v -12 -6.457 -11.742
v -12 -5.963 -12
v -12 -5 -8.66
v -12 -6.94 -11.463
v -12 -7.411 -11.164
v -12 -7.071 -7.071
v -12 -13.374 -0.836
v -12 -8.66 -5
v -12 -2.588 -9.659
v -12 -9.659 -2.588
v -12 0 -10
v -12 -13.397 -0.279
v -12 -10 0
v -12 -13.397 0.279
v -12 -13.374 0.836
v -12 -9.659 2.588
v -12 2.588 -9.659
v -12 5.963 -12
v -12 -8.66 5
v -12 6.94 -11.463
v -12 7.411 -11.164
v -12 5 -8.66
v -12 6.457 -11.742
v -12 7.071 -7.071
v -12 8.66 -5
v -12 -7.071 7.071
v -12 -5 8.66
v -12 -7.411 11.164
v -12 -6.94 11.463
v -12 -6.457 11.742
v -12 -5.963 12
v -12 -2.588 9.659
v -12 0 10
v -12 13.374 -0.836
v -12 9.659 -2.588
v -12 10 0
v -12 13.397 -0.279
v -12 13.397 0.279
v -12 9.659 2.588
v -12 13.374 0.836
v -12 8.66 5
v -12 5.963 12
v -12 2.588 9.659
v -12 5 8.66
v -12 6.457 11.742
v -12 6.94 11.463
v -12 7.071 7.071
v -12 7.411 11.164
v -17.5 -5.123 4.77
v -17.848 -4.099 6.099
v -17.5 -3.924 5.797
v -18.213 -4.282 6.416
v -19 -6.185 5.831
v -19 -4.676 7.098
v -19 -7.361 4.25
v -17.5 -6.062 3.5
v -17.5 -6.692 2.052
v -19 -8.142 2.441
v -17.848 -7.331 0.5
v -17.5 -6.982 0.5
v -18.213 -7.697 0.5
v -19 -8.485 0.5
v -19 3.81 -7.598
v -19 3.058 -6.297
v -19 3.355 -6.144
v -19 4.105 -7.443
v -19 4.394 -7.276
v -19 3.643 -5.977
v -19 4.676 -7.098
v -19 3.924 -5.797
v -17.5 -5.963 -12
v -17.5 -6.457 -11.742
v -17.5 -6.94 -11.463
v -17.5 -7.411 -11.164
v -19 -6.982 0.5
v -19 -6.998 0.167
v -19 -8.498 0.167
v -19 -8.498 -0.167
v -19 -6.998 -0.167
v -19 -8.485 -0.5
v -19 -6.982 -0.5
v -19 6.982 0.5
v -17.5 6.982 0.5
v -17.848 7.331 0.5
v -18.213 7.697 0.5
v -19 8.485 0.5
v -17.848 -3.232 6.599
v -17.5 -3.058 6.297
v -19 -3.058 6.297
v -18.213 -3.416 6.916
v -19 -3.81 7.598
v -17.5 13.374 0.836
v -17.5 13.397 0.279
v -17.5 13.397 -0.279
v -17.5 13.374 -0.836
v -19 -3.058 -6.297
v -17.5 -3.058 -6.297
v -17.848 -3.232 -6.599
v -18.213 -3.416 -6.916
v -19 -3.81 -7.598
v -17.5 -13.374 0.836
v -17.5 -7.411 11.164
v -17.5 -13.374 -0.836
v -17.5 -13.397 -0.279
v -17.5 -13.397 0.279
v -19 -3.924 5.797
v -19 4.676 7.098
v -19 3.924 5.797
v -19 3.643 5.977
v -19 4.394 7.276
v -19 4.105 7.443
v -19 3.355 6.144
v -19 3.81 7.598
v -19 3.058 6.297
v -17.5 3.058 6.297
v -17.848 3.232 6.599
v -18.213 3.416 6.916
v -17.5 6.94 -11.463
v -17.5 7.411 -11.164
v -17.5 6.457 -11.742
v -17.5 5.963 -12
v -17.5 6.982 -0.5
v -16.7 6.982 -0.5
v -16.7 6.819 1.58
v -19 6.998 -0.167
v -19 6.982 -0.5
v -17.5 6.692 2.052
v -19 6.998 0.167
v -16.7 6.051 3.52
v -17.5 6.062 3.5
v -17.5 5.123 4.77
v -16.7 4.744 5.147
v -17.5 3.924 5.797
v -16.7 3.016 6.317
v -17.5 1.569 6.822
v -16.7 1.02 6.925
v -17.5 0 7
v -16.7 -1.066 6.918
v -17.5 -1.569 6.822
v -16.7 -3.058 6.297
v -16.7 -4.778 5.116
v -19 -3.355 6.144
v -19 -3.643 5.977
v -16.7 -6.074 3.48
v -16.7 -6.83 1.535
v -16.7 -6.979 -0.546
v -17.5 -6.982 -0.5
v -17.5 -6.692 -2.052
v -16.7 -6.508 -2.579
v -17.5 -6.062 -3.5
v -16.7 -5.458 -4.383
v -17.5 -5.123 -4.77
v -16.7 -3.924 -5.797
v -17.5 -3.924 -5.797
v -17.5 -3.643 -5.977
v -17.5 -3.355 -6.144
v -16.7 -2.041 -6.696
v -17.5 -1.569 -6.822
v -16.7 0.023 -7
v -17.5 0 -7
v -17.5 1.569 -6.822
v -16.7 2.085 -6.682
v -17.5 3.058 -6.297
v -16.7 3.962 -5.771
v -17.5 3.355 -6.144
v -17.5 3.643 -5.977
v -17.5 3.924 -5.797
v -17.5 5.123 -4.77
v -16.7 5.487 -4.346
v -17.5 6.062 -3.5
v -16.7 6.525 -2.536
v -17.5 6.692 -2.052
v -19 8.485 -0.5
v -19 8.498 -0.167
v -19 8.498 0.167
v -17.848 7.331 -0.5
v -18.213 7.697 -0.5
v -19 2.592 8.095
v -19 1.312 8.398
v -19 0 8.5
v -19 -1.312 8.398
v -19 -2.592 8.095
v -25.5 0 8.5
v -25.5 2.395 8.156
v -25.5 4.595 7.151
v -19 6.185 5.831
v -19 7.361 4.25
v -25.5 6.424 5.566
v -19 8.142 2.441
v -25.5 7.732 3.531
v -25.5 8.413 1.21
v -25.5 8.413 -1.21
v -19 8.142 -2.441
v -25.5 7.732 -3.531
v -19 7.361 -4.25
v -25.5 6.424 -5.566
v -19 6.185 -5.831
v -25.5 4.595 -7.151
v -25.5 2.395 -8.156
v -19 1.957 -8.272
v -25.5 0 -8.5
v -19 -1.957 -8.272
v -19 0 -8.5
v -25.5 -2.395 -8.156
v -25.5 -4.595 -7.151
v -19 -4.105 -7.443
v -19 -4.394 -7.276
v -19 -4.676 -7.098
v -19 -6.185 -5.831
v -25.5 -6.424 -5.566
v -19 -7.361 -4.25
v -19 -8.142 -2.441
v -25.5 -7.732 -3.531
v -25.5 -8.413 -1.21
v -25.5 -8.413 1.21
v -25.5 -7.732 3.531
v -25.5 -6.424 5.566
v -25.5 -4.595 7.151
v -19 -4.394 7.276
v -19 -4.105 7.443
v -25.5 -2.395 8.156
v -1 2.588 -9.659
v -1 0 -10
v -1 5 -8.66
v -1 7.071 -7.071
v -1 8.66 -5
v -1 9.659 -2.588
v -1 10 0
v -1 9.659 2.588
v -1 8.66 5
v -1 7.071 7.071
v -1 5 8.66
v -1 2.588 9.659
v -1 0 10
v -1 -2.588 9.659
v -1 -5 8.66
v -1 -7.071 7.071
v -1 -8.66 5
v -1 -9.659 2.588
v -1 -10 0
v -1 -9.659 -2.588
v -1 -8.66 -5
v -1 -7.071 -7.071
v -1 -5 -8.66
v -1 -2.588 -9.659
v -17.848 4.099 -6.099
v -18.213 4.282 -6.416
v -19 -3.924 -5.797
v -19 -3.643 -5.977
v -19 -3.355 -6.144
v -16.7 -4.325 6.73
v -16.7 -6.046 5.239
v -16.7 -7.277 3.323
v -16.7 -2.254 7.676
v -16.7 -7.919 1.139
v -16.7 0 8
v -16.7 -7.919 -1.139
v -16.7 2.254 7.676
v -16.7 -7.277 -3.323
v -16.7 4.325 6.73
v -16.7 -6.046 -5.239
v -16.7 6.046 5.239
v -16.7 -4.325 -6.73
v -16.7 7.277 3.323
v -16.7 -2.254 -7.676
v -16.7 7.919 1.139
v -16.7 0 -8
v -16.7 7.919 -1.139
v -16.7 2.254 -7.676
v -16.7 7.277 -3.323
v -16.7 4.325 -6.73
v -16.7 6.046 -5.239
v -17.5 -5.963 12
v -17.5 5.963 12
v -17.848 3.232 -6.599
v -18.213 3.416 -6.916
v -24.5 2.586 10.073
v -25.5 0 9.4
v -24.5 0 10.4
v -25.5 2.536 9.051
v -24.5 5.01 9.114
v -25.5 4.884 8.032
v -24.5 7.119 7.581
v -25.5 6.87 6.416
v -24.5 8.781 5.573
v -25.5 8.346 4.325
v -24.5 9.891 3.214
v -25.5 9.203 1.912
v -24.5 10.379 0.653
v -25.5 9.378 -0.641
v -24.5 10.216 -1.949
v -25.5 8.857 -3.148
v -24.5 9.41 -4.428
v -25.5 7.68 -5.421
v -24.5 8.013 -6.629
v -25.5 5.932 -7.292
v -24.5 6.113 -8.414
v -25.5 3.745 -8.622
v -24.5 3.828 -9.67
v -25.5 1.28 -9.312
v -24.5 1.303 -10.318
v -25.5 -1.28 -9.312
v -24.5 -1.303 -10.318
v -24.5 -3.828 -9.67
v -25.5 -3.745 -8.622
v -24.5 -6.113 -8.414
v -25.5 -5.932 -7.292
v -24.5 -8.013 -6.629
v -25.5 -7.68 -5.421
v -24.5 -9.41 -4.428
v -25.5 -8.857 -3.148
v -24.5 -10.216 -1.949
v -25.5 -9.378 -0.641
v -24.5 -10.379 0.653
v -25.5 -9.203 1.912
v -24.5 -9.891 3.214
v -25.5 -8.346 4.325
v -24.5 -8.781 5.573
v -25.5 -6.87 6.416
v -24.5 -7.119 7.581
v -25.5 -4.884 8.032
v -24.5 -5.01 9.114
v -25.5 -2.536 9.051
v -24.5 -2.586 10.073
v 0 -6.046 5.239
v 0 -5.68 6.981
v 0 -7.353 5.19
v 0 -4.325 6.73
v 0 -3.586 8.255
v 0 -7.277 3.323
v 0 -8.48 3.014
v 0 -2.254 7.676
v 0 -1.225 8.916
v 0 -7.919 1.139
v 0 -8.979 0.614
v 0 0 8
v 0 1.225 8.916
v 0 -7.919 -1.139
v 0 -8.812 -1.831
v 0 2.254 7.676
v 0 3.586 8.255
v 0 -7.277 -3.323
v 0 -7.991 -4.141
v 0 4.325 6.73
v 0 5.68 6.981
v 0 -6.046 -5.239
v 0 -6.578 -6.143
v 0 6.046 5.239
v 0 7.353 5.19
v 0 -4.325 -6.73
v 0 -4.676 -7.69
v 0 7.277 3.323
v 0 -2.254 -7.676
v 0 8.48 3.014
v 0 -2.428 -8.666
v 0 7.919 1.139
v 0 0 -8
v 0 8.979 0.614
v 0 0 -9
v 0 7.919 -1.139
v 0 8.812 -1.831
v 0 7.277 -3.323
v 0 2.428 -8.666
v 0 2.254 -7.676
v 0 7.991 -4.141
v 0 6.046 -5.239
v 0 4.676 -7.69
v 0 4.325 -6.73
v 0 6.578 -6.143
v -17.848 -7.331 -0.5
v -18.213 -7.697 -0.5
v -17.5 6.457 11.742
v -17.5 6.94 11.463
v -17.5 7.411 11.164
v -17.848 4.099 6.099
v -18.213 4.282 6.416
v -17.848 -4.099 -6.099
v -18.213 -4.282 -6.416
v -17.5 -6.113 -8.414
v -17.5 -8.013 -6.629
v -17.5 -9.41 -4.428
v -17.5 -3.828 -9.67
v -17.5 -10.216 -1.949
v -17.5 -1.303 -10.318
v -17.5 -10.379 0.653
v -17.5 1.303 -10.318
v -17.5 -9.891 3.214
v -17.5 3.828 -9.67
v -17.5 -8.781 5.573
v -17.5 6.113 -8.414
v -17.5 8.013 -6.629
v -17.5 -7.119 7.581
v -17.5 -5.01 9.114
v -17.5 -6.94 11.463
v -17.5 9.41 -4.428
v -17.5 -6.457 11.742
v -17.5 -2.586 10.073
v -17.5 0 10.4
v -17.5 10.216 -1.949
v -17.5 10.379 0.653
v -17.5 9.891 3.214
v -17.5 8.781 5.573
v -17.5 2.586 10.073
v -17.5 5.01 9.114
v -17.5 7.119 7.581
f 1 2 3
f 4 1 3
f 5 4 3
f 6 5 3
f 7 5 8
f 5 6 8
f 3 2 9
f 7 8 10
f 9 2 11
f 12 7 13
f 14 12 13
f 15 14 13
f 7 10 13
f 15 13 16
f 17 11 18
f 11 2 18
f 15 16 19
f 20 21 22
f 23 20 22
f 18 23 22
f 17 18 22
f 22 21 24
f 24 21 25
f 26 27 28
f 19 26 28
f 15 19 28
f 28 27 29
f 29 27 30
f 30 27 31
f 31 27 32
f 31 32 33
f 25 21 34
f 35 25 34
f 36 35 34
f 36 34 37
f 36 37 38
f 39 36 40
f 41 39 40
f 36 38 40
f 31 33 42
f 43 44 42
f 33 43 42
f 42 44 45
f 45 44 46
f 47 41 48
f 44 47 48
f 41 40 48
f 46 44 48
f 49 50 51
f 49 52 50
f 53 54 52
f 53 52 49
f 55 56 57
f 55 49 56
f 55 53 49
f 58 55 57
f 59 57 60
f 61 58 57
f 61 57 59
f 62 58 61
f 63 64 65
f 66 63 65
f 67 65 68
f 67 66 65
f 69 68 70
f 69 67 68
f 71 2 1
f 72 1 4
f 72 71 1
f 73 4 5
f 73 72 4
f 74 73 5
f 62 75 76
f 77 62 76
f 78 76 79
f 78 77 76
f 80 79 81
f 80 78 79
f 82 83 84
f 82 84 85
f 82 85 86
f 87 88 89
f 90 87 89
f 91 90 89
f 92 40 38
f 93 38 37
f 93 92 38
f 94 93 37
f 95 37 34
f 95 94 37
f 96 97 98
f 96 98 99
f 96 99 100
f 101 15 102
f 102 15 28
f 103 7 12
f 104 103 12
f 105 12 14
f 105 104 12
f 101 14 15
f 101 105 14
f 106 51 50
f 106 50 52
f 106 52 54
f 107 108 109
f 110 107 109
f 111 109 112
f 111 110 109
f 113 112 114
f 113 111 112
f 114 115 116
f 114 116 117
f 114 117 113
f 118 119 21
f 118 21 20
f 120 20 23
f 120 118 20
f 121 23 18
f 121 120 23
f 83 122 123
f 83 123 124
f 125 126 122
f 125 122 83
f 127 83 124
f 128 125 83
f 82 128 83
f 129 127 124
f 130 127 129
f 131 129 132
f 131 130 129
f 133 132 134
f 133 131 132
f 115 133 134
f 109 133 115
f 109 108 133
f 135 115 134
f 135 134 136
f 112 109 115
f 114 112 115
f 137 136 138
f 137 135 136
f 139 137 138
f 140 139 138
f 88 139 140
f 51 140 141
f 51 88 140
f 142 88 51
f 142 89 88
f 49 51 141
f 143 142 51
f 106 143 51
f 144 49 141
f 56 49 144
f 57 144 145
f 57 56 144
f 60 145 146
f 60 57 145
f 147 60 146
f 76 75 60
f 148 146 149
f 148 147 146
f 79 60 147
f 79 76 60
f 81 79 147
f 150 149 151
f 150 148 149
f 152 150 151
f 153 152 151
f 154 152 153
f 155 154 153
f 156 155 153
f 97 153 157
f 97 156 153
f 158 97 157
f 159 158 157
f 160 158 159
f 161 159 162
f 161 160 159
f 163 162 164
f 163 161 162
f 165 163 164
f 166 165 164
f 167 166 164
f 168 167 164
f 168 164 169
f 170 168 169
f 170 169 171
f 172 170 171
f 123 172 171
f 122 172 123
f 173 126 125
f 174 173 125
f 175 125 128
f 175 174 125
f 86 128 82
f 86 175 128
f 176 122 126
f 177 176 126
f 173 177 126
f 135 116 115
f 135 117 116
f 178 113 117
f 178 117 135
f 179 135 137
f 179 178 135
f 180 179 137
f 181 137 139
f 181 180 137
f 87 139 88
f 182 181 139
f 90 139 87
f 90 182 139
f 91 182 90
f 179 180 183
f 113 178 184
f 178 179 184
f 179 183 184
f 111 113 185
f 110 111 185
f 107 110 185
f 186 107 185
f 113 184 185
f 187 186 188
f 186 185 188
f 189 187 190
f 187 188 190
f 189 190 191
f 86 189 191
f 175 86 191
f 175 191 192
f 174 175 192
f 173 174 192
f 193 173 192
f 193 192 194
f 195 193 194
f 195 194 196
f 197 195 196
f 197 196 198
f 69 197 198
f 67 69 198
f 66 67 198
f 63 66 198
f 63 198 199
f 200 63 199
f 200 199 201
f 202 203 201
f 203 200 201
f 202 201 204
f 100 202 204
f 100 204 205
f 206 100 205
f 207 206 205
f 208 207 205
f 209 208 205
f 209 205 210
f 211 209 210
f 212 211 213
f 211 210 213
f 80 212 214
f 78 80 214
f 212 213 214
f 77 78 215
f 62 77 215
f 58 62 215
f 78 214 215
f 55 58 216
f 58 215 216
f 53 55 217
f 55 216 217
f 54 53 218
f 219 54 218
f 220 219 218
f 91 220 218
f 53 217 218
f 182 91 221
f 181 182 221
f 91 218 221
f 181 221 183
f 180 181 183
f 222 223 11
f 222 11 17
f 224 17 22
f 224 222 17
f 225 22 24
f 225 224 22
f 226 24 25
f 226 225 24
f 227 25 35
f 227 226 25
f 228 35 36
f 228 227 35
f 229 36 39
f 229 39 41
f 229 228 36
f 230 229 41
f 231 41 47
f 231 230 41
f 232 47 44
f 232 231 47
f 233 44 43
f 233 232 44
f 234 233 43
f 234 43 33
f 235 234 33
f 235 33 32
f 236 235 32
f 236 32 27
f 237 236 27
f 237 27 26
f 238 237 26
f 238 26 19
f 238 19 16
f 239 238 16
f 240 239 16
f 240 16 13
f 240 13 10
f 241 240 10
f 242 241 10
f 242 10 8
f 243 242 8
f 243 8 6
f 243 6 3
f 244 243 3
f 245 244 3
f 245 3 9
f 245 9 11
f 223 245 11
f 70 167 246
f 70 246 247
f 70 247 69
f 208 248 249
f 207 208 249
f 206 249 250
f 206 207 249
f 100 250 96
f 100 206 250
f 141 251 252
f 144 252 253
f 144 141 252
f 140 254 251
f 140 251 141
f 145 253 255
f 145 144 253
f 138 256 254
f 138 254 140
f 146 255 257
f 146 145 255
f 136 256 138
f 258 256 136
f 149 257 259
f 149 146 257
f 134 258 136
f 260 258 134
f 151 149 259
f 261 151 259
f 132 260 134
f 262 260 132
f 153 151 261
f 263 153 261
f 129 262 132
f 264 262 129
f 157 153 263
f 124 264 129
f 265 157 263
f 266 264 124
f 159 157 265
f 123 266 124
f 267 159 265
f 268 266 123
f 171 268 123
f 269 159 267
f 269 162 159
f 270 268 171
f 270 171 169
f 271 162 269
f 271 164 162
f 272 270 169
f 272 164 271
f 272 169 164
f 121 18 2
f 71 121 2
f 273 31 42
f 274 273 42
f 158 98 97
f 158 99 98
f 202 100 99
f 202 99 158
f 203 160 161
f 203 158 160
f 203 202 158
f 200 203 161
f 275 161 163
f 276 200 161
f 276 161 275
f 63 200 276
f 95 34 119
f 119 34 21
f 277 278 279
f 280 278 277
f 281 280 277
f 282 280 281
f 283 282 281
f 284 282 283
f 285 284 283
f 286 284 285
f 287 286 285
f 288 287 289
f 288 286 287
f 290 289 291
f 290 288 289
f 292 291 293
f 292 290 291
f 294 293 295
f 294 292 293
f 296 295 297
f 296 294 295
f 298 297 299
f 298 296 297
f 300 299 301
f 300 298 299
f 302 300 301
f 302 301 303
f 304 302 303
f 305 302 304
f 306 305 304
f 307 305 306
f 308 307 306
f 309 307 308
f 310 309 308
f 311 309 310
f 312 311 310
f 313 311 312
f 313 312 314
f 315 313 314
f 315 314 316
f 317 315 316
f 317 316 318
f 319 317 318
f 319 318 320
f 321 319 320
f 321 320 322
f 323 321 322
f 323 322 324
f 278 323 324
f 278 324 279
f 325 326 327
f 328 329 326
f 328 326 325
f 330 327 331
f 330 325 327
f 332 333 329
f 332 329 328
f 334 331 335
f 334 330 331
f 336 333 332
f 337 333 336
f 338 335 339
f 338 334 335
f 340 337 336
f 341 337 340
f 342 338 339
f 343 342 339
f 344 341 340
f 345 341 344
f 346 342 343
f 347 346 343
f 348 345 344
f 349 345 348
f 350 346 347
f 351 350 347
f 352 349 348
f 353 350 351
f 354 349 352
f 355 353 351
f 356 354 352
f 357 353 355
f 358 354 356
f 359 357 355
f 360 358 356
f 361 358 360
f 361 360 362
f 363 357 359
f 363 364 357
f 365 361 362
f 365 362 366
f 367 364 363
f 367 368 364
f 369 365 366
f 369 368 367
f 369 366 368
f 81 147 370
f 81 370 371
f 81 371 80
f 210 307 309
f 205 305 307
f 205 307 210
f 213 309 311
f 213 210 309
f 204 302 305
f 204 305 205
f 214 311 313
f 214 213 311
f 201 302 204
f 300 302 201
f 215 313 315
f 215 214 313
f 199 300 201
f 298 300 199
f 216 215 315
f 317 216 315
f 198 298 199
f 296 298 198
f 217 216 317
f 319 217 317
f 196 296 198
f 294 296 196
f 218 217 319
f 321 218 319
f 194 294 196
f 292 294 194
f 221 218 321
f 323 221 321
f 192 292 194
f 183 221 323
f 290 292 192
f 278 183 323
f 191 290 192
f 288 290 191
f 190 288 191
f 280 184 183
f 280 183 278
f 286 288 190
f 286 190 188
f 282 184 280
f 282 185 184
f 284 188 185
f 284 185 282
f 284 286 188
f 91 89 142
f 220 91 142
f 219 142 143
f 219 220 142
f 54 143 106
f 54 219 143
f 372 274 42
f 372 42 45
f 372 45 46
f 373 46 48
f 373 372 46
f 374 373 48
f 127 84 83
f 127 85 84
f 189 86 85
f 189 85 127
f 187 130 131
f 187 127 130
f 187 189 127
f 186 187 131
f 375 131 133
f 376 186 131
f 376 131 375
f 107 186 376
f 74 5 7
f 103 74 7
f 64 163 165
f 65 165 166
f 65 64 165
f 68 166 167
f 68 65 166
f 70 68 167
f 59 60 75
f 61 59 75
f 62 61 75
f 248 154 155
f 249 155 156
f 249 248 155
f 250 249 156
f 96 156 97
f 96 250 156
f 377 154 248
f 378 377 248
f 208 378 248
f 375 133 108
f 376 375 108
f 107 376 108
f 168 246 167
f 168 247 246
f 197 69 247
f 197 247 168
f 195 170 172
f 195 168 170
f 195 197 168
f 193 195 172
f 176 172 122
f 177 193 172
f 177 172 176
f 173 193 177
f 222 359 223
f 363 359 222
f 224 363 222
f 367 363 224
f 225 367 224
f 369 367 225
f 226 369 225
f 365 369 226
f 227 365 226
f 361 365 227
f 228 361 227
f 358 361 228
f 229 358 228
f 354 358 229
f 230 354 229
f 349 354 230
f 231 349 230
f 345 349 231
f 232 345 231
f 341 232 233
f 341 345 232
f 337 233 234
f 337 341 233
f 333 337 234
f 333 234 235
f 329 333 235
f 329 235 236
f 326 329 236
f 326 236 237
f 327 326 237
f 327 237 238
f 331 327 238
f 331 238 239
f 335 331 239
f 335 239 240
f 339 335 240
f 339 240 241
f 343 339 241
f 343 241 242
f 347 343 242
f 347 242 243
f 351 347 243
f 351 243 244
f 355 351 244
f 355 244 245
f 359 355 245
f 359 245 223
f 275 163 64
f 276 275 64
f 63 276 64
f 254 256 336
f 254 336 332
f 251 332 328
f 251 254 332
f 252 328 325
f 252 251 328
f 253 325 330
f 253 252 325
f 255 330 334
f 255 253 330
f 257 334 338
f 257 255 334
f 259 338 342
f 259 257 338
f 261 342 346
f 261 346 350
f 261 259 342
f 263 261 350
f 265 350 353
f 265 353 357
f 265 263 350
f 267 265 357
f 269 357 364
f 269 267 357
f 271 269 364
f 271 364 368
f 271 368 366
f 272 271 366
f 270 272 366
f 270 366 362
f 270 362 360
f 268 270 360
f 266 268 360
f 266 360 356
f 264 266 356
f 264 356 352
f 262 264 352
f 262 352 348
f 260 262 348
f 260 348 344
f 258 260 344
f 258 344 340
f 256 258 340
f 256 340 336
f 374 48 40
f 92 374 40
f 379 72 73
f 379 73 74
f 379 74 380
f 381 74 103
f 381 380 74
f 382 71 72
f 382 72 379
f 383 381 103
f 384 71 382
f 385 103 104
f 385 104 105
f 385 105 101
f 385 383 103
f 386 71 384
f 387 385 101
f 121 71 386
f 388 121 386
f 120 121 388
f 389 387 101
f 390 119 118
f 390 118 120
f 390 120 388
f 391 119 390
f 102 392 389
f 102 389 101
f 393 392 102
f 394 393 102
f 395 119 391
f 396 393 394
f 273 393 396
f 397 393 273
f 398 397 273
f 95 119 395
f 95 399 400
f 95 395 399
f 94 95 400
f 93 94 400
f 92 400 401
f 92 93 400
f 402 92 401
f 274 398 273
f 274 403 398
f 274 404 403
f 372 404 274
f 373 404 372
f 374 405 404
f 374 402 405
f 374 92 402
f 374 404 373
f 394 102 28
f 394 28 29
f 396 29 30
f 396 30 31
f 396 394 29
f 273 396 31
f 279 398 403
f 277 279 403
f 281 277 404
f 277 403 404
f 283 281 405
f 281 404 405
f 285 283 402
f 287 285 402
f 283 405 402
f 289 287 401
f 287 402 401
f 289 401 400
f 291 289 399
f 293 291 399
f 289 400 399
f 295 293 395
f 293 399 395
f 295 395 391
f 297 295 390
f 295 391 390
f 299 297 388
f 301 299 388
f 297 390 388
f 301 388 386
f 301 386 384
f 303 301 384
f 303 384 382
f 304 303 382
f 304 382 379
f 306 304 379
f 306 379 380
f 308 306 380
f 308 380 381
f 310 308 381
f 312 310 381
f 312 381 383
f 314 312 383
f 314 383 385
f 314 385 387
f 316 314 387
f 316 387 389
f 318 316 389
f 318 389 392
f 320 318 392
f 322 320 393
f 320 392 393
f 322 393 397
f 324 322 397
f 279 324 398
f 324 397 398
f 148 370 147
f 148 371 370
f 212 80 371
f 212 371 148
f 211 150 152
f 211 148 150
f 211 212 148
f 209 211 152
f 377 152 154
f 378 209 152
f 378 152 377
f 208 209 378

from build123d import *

# Parameters (mm, degrees)
SKETCH_2_R               = 10
EXTRUDE_1_DEPTH          = 12
SKETCH_3_R               = 10
EXTRUDE_2_DEPTH          = 5.5
SKETCH_4_R               = 10.4
EXTRUDE_3_DEPTH          = 8
SKETCH_6_R               = 13.856406461
SKETCH_6_R_2             = 13.4
CUT_EXTRUDE_1_DEPTH      = 26.342651795
CHAMFER_1_SIZE           = 1
EXTRUDE_4_REACH          = 26.545
SKETCH_7_W               = 1
SKETCH_7_H               = 8.5
SKETCH_8_R               = 7
CUT_EXTRUDE_2_DEPTH      = 32.205928924
SKETCH_9_R               = 8.5
CUT_EXTRUDE_3_DEPTH      = 6.5
PATTERN_CIRCULAR_1_COUNT = 6


with BuildPart() as part:
    # Эскиз2 → Вытянуть1 (new body)
    with BuildSketch(Plane(origin=(0, 0, 0), x_dir=(0, 0, -1), z_dir=(1, 0, 0))):
        Circle(SKETCH_2_R)
    extrude(amount=-EXTRUDE_1_DEPTH)

    # Эскиз3 → Вытянуть2 (add)
    # profile 1 of 2: a face of its own
    with BuildSketch(Plane.ZY.offset(12)):
        Polygon((12, -6.92820323), (12, 6.92820323), (0, 13.856406461), (-12, 6.92820323), (-12, -6.92820323), (0, -13.856406461), align=None)
        with Locations(Location((0, 0, 0), (0, 0, 180))):
            Circle(SKETCH_3_R, mode=Mode.SUBTRACT)
    # profile 2 of 2: a face of its own
    with BuildSketch(Plane.ZY.offset(12)):
        with Locations(Location((0, 0, 0), (0, 0, 180))):
            Circle(SKETCH_3_R)
    extrude(amount=EXTRUDE_2_DEPTH)

    # Эскиз4 → Вытянуть3 (add)
    with BuildSketch(Plane.ZY.offset(17.5)):
        Circle(SKETCH_4_R)
    extrude(amount=EXTRUDE_3_DEPTH)

    # Эскиз5 → Вырез-Повернуть1 (revolve, cut)
    with BuildSketch(Plane.XY, mode=Mode.PRIVATE) as cut_revolve_1_sk:
        Polygon((0, 0), (0, 8), (-16.7, 8), (-16.7, 7), (-17.5, 7), (-19, 8.5), (-25.5, 8.5), (-25.5, 0), align=None)
    revolve(cut_revolve_1_sk.sketch.rotate(Axis((-25.5, 0, 0), (1, 0, 0)), 90), axis=Axis((-25.5, 0, 0), (1, 0, 0)), mode=Mode.SUBTRACT)

    # Эскиз6 → Вырез-Вытянуть1 (cut, through all)
    with BuildSketch(Plane.ZY.offset(17.5)):
        Circle(SKETCH_6_R)
        Circle(SKETCH_6_R_2, mode=Mode.SUBTRACT)
    extrude(amount=-CUT_EXTRUDE_1_DEPTH, mode=Mode.SUBTRACT)

    # Фаска1
    chamfer_1_edges = [part.edges().sort_by_distance(p)[0] for p in [
        (0, 0, 10),
        (-25.5, 0, -10.4),
    ]]
    chamfer(chamfer_1_edges, length=CHAMFER_1_SIZE)

    # Вытянуть4: up to this face of the body (flat: up to its plane)
    extrude_4_end = Plane(part.part.faces().sort_by_distance((-25.5, 0, -9.13412785))[0])
    # Эскиз7 → Вытянуть4 (add, up to the picked face)
    with BuildSketch(Plane(origin=(-16.7, 0, 0), x_dir=(0, 0, -1), z_dir=(1, 0, 0)), mode=Mode.PRIVATE) as extrude_4_sk1:
        with Locations((0, 4.25)):
            Rectangle(SKETCH_7_W, SKETCH_7_H)
    extrude_4_tool1 = split(extrude(extrude_4_sk1.sketch, amount=-EXTRUDE_4_REACH, mode=Mode.PRIVATE), bisect_by=extrude_4_end, keep=Keep.BOTH, mode=Mode.PRIVATE)
    add(extrude_4_tool1.solids().sort_by(Axis((-16.7, 4.25, 0), (-1, 0, 0)))[0])

    # Эскиз8 → Вырез-Вытянуть2 (cut, through all)
    with BuildSketch(Plane.ZY.offset(25.5)):
        Circle(SKETCH_8_R)
    extrude(amount=-CUT_EXTRUDE_2_DEPTH, mode=Mode.SUBTRACT)

    # Эскиз9 → Вырез-Вытянуть3 (cut)
    with BuildSketch(Plane.ZY.offset(25.5)):
        Circle(SKETCH_9_R)
    extrude(amount=-CUT_EXTRUDE_3_DEPTH, mode=Mode.SUBTRACT)

    # Круговой массив1: part ×6 about axis
    pattern_circular_1_axis = Axis((0, 0, 0), (1, 0, 0))


with BuildPart() as part_1:
    add(part.part)
    for i in range(1, PATTERN_CIRCULAR_1_COUNT):
        add(part.part.rotate(pattern_circular_1_axis, i * 360 / PATTERN_CIRCULAR_1_COUNT))


solid = part_1.part
